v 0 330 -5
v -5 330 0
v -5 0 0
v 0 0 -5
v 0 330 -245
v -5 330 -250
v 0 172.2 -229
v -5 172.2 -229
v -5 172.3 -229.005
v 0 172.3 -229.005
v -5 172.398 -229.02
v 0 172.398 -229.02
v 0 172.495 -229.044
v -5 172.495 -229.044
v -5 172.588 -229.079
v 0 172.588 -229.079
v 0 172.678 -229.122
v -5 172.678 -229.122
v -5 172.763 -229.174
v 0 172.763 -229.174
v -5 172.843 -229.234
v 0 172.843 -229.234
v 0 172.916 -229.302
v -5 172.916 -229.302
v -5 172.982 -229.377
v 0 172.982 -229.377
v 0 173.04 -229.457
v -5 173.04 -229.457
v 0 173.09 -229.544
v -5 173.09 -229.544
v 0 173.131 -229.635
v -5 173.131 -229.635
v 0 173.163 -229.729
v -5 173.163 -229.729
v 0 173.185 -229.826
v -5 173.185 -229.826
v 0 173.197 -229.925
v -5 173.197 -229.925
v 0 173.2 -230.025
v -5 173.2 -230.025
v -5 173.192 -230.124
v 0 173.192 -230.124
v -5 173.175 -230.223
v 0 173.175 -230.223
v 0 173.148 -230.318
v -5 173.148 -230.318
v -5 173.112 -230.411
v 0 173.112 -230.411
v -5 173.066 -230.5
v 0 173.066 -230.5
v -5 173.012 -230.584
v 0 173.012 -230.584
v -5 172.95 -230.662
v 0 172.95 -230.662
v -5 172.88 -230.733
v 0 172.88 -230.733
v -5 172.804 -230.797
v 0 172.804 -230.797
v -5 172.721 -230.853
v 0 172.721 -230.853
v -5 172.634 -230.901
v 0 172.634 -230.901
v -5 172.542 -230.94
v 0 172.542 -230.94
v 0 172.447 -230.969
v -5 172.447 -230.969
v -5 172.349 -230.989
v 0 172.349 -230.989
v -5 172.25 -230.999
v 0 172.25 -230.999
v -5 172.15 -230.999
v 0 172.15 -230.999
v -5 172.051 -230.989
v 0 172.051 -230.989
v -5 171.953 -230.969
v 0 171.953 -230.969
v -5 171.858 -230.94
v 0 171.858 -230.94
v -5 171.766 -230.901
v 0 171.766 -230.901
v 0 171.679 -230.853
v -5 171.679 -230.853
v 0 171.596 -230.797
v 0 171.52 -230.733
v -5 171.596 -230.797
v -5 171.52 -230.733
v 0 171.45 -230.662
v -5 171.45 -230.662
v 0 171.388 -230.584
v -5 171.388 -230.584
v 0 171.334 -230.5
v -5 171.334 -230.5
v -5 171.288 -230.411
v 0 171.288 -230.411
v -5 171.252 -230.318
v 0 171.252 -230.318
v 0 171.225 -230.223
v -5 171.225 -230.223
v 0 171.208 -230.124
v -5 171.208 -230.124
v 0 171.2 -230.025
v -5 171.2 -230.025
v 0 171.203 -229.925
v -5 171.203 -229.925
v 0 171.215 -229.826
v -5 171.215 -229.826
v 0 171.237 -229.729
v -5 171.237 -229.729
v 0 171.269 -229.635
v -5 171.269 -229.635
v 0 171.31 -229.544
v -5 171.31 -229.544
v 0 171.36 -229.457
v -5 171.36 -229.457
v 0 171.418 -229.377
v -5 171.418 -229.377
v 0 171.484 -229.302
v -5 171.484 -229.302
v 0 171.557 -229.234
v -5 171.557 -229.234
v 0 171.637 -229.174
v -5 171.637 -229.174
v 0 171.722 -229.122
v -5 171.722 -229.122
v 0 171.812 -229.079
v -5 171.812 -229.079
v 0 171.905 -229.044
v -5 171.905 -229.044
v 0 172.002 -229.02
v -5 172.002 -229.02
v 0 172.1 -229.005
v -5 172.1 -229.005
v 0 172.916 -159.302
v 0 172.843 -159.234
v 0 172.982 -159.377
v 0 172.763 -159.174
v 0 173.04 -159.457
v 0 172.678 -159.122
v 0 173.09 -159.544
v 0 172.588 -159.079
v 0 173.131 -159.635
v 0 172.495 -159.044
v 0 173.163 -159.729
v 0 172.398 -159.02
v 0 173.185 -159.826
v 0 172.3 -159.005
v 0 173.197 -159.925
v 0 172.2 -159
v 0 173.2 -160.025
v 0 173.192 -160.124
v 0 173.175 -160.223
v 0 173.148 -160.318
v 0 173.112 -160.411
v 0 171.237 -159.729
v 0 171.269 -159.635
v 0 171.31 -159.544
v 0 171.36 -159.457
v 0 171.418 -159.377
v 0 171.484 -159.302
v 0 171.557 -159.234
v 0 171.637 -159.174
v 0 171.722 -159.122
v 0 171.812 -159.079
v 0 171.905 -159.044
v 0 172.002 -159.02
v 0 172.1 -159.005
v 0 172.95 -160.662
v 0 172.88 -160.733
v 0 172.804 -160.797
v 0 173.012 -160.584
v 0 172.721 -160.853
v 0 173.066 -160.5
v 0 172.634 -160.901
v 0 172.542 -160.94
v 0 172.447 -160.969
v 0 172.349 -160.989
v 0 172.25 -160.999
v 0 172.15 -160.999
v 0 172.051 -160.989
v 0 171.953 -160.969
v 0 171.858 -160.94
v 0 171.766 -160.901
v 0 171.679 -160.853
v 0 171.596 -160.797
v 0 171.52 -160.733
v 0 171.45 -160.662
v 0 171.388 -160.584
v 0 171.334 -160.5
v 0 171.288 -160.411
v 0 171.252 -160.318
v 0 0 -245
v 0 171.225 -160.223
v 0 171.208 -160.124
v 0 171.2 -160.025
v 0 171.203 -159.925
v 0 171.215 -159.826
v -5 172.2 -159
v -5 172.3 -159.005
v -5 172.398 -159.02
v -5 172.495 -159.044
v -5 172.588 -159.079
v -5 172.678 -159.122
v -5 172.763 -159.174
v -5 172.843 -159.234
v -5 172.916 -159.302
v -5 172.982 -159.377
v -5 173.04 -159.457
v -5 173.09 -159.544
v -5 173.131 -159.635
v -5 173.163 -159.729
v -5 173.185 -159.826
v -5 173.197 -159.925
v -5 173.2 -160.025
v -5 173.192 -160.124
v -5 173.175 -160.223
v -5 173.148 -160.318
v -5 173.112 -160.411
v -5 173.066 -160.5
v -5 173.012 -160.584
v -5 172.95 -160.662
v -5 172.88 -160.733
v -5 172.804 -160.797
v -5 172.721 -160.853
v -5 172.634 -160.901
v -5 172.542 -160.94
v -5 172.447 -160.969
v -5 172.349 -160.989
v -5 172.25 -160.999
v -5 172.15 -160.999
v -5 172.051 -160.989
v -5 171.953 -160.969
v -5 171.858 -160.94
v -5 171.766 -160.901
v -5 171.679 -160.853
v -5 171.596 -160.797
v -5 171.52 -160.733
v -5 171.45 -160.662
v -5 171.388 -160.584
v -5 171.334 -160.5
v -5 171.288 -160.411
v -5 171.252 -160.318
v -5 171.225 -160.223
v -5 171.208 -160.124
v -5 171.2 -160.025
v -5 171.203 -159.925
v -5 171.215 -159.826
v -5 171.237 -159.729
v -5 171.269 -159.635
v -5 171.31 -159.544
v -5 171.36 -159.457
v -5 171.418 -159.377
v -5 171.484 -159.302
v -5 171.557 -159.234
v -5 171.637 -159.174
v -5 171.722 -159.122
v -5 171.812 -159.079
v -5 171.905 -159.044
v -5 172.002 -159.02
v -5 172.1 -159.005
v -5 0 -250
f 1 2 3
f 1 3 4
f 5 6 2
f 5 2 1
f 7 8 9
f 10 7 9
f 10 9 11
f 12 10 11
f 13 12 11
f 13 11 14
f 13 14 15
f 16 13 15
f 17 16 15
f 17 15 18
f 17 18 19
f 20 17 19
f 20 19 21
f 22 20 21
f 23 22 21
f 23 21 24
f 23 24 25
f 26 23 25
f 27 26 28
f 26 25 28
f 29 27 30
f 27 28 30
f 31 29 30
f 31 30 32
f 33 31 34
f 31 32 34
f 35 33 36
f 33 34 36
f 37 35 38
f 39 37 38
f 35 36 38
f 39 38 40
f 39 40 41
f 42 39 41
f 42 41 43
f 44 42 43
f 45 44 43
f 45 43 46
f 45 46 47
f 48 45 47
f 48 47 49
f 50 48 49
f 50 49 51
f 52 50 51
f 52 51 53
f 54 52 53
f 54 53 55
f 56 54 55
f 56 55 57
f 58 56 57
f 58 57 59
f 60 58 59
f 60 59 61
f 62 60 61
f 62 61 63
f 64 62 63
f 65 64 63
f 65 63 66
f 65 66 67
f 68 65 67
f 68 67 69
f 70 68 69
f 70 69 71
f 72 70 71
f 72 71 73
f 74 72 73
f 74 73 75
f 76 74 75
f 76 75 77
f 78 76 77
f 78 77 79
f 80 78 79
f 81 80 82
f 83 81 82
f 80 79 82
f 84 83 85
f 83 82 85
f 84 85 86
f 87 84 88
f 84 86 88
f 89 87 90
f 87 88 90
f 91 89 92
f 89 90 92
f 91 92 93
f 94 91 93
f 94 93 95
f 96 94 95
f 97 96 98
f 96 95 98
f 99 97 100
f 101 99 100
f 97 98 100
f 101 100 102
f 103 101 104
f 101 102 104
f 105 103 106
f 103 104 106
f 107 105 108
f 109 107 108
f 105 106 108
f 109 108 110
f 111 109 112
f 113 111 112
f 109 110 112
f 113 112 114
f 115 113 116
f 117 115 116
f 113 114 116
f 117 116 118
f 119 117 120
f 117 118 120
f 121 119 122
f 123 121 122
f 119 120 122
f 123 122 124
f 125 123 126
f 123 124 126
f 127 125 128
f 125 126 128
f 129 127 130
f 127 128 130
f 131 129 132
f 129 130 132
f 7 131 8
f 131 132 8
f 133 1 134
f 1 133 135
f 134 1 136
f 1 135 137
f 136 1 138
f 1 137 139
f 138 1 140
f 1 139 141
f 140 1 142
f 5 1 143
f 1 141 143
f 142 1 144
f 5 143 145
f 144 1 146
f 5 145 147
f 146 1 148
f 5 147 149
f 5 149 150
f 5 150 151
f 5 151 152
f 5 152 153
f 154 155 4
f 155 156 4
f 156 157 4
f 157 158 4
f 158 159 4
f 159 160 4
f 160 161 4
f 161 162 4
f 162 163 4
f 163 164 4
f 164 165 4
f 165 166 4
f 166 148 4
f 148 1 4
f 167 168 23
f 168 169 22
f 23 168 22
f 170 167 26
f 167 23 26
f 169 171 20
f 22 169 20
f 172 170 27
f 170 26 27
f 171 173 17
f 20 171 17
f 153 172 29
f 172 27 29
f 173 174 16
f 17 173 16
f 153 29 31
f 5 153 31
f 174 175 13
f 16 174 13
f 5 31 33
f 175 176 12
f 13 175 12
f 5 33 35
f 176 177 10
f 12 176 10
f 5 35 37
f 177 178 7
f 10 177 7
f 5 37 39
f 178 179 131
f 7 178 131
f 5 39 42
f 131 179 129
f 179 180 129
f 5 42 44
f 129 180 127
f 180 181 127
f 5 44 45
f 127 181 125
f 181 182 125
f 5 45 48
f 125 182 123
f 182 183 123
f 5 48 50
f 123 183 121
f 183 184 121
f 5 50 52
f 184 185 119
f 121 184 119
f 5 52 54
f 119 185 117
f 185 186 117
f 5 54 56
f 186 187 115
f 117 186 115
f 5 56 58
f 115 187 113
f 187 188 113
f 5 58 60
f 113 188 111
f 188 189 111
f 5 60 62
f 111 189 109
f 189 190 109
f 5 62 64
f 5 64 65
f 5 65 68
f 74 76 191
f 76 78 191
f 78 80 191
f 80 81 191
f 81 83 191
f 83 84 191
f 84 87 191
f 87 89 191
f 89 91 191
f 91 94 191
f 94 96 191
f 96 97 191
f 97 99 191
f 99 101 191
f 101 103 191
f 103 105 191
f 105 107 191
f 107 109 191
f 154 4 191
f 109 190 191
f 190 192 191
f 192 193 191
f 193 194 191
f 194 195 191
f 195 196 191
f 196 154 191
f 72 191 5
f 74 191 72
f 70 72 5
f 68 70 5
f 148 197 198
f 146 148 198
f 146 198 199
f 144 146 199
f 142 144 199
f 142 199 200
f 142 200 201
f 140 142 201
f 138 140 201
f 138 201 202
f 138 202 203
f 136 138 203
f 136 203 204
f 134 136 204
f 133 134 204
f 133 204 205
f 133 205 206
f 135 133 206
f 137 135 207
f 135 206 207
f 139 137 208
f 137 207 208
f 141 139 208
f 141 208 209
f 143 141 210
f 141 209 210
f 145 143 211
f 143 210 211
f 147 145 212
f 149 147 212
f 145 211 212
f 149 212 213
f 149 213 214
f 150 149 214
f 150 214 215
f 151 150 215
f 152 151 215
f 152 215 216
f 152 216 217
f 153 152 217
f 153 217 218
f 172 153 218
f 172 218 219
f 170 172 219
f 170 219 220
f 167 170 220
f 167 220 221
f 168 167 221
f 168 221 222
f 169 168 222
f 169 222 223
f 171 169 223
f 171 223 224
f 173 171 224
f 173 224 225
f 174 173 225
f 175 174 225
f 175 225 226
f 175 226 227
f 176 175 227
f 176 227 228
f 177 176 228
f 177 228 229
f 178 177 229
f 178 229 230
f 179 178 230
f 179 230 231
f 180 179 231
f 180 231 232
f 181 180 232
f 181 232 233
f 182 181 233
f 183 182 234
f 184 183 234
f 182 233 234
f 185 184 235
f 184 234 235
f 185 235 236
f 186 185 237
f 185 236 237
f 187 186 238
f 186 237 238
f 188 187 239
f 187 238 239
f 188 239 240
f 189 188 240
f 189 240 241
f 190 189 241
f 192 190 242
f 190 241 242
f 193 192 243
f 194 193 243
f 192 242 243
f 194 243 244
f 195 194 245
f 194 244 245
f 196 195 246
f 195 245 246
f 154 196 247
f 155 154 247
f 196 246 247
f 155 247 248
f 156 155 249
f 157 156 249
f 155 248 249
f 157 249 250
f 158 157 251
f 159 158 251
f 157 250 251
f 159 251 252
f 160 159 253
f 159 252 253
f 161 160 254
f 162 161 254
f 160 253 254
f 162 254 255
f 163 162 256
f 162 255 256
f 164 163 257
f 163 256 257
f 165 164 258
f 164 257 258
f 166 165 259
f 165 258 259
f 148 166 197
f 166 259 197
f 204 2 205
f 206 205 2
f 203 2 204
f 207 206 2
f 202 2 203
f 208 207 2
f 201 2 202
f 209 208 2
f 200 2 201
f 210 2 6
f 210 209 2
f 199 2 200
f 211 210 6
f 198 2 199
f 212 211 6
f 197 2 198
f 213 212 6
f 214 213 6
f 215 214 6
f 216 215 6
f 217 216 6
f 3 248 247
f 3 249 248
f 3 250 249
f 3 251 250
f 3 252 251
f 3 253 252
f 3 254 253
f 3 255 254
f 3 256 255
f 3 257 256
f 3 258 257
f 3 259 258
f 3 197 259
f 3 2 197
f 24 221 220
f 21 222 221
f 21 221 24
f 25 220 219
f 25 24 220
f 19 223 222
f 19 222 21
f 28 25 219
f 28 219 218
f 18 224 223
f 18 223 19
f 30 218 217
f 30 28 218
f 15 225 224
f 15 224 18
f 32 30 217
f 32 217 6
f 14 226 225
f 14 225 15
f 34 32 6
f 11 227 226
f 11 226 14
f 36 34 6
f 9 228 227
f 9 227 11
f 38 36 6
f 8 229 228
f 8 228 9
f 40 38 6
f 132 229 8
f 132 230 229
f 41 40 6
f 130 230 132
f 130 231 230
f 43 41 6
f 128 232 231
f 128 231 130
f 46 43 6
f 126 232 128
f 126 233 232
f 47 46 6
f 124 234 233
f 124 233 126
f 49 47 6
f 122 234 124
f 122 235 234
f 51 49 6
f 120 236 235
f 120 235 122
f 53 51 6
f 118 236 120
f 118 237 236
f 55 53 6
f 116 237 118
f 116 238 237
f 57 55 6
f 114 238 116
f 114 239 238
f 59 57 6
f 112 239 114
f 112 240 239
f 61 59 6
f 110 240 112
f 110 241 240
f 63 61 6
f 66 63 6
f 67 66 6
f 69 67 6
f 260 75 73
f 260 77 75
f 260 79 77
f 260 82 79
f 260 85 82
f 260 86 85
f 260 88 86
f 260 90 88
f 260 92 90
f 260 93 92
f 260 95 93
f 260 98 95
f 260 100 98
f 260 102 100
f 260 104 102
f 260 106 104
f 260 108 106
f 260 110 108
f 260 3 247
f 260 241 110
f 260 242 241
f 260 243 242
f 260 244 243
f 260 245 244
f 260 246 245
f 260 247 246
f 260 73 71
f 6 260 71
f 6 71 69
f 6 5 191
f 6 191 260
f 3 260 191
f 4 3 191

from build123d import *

# Parameters (mm, degrees)
CROQUIS1_W              = 5
CROQUIS1_H              = 250
SALIENTE_EXTRUIR1_DEPTH = 330
CORTAR_EXTRUIR1_REACH   = 416.035
CORTAR_EXTRUIR2_REACH   = 416.035
CROQUIS6_R              = 1


with BuildPart() as part:
    # Croquis1 → Saliente-Extruir1 (new body)
    with BuildSketch(Plane(origin=(0, 0, 0), x_dir=(1, 0, 0), z_dir=(0, 1, 0))):
        with Locations((-2.5, 125)):
            Rectangle(CROQUIS1_W, CROQUIS1_H)
    extrude(amount=SALIENTE_EXTRUIR1_DEPTH)

    # Croquis2 → Cortar-Extruir1 (cut, up to next)
    with BuildSketch(Plane(origin=(0, 330, 0), x_dir=(1, 0, 0), z_dir=(0, 1, 0)), mode=Mode.PRIVATE) as cortar_extruir1_sk1:
        Polygon((0, 250), (0, 245), (-5, 250), align=None)
    cortar_extruir1_tool1 = extrude(cortar_extruir1_sk1.sketch, amount=-CORTAR_EXTRUIR1_REACH, mode=Mode.PRIVATE) & part.part
    # Croquis2 → Cortar-Extruir1 (cut, up to next)
    with BuildSketch(Plane(origin=(0, 330, 0), x_dir=(1, 0, 0), z_dir=(0, 1, 0)), mode=Mode.PRIVATE) as cortar_extruir1_sk2:
        Polygon((-5, 0), (0, 5), (0, 0), align=None)
    cortar_extruir1_tool2 = extrude(cortar_extruir1_sk2.sketch, amount=-CORTAR_EXTRUIR1_REACH, mode=Mode.PRIVATE) & part.part
    add(cortar_extruir1_tool1.solids().sort_by_distance((-1.666667, 330, -248.333333))[0], mode=Mode.SUBTRACT)
    add(cortar_extruir1_tool2.solids().sort_by_distance((-1.666667, 330, -1.666667))[0], mode=Mode.SUBTRACT)

    # Croquis6 → Cortar-Extruir2 (cut, up to next)
    with BuildSketch(Plane.ZY.offset(5), mode=Mode.PRIVATE) as cortar_extruir2_sk1:
        with Locations((-230, 172.2)):
            Circle(CROQUIS6_R)
    cortar_extruir2_tool1 = extrude(cortar_extruir2_sk1.sketch, amount=-CORTAR_EXTRUIR2_REACH, mode=Mode.PRIVATE) & part.part
    # Croquis6 → Cortar-Extruir2 (cut, up to next)
    with BuildSketch(Plane.ZY.offset(5), mode=Mode.PRIVATE) as cortar_extruir2_sk2:
        with Locations((-160, 172.2)):
            Circle(CROQUIS6_R)
    cortar_extruir2_tool2 = extrude(cortar_extruir2_sk2.sketch, amount=-CORTAR_EXTRUIR2_REACH, mode=Mode.PRIVATE) & part.part
    add(cortar_extruir2_tool1.solids().sort_by_distance((-5, 172.2, -230))[0], mode=Mode.SUBTRACT)
    add(cortar_extruir2_tool2.solids().sort_by_distance((-5, 172.2, -160))[0], mode=Mode.SUBTRACT)


solid = part.part
